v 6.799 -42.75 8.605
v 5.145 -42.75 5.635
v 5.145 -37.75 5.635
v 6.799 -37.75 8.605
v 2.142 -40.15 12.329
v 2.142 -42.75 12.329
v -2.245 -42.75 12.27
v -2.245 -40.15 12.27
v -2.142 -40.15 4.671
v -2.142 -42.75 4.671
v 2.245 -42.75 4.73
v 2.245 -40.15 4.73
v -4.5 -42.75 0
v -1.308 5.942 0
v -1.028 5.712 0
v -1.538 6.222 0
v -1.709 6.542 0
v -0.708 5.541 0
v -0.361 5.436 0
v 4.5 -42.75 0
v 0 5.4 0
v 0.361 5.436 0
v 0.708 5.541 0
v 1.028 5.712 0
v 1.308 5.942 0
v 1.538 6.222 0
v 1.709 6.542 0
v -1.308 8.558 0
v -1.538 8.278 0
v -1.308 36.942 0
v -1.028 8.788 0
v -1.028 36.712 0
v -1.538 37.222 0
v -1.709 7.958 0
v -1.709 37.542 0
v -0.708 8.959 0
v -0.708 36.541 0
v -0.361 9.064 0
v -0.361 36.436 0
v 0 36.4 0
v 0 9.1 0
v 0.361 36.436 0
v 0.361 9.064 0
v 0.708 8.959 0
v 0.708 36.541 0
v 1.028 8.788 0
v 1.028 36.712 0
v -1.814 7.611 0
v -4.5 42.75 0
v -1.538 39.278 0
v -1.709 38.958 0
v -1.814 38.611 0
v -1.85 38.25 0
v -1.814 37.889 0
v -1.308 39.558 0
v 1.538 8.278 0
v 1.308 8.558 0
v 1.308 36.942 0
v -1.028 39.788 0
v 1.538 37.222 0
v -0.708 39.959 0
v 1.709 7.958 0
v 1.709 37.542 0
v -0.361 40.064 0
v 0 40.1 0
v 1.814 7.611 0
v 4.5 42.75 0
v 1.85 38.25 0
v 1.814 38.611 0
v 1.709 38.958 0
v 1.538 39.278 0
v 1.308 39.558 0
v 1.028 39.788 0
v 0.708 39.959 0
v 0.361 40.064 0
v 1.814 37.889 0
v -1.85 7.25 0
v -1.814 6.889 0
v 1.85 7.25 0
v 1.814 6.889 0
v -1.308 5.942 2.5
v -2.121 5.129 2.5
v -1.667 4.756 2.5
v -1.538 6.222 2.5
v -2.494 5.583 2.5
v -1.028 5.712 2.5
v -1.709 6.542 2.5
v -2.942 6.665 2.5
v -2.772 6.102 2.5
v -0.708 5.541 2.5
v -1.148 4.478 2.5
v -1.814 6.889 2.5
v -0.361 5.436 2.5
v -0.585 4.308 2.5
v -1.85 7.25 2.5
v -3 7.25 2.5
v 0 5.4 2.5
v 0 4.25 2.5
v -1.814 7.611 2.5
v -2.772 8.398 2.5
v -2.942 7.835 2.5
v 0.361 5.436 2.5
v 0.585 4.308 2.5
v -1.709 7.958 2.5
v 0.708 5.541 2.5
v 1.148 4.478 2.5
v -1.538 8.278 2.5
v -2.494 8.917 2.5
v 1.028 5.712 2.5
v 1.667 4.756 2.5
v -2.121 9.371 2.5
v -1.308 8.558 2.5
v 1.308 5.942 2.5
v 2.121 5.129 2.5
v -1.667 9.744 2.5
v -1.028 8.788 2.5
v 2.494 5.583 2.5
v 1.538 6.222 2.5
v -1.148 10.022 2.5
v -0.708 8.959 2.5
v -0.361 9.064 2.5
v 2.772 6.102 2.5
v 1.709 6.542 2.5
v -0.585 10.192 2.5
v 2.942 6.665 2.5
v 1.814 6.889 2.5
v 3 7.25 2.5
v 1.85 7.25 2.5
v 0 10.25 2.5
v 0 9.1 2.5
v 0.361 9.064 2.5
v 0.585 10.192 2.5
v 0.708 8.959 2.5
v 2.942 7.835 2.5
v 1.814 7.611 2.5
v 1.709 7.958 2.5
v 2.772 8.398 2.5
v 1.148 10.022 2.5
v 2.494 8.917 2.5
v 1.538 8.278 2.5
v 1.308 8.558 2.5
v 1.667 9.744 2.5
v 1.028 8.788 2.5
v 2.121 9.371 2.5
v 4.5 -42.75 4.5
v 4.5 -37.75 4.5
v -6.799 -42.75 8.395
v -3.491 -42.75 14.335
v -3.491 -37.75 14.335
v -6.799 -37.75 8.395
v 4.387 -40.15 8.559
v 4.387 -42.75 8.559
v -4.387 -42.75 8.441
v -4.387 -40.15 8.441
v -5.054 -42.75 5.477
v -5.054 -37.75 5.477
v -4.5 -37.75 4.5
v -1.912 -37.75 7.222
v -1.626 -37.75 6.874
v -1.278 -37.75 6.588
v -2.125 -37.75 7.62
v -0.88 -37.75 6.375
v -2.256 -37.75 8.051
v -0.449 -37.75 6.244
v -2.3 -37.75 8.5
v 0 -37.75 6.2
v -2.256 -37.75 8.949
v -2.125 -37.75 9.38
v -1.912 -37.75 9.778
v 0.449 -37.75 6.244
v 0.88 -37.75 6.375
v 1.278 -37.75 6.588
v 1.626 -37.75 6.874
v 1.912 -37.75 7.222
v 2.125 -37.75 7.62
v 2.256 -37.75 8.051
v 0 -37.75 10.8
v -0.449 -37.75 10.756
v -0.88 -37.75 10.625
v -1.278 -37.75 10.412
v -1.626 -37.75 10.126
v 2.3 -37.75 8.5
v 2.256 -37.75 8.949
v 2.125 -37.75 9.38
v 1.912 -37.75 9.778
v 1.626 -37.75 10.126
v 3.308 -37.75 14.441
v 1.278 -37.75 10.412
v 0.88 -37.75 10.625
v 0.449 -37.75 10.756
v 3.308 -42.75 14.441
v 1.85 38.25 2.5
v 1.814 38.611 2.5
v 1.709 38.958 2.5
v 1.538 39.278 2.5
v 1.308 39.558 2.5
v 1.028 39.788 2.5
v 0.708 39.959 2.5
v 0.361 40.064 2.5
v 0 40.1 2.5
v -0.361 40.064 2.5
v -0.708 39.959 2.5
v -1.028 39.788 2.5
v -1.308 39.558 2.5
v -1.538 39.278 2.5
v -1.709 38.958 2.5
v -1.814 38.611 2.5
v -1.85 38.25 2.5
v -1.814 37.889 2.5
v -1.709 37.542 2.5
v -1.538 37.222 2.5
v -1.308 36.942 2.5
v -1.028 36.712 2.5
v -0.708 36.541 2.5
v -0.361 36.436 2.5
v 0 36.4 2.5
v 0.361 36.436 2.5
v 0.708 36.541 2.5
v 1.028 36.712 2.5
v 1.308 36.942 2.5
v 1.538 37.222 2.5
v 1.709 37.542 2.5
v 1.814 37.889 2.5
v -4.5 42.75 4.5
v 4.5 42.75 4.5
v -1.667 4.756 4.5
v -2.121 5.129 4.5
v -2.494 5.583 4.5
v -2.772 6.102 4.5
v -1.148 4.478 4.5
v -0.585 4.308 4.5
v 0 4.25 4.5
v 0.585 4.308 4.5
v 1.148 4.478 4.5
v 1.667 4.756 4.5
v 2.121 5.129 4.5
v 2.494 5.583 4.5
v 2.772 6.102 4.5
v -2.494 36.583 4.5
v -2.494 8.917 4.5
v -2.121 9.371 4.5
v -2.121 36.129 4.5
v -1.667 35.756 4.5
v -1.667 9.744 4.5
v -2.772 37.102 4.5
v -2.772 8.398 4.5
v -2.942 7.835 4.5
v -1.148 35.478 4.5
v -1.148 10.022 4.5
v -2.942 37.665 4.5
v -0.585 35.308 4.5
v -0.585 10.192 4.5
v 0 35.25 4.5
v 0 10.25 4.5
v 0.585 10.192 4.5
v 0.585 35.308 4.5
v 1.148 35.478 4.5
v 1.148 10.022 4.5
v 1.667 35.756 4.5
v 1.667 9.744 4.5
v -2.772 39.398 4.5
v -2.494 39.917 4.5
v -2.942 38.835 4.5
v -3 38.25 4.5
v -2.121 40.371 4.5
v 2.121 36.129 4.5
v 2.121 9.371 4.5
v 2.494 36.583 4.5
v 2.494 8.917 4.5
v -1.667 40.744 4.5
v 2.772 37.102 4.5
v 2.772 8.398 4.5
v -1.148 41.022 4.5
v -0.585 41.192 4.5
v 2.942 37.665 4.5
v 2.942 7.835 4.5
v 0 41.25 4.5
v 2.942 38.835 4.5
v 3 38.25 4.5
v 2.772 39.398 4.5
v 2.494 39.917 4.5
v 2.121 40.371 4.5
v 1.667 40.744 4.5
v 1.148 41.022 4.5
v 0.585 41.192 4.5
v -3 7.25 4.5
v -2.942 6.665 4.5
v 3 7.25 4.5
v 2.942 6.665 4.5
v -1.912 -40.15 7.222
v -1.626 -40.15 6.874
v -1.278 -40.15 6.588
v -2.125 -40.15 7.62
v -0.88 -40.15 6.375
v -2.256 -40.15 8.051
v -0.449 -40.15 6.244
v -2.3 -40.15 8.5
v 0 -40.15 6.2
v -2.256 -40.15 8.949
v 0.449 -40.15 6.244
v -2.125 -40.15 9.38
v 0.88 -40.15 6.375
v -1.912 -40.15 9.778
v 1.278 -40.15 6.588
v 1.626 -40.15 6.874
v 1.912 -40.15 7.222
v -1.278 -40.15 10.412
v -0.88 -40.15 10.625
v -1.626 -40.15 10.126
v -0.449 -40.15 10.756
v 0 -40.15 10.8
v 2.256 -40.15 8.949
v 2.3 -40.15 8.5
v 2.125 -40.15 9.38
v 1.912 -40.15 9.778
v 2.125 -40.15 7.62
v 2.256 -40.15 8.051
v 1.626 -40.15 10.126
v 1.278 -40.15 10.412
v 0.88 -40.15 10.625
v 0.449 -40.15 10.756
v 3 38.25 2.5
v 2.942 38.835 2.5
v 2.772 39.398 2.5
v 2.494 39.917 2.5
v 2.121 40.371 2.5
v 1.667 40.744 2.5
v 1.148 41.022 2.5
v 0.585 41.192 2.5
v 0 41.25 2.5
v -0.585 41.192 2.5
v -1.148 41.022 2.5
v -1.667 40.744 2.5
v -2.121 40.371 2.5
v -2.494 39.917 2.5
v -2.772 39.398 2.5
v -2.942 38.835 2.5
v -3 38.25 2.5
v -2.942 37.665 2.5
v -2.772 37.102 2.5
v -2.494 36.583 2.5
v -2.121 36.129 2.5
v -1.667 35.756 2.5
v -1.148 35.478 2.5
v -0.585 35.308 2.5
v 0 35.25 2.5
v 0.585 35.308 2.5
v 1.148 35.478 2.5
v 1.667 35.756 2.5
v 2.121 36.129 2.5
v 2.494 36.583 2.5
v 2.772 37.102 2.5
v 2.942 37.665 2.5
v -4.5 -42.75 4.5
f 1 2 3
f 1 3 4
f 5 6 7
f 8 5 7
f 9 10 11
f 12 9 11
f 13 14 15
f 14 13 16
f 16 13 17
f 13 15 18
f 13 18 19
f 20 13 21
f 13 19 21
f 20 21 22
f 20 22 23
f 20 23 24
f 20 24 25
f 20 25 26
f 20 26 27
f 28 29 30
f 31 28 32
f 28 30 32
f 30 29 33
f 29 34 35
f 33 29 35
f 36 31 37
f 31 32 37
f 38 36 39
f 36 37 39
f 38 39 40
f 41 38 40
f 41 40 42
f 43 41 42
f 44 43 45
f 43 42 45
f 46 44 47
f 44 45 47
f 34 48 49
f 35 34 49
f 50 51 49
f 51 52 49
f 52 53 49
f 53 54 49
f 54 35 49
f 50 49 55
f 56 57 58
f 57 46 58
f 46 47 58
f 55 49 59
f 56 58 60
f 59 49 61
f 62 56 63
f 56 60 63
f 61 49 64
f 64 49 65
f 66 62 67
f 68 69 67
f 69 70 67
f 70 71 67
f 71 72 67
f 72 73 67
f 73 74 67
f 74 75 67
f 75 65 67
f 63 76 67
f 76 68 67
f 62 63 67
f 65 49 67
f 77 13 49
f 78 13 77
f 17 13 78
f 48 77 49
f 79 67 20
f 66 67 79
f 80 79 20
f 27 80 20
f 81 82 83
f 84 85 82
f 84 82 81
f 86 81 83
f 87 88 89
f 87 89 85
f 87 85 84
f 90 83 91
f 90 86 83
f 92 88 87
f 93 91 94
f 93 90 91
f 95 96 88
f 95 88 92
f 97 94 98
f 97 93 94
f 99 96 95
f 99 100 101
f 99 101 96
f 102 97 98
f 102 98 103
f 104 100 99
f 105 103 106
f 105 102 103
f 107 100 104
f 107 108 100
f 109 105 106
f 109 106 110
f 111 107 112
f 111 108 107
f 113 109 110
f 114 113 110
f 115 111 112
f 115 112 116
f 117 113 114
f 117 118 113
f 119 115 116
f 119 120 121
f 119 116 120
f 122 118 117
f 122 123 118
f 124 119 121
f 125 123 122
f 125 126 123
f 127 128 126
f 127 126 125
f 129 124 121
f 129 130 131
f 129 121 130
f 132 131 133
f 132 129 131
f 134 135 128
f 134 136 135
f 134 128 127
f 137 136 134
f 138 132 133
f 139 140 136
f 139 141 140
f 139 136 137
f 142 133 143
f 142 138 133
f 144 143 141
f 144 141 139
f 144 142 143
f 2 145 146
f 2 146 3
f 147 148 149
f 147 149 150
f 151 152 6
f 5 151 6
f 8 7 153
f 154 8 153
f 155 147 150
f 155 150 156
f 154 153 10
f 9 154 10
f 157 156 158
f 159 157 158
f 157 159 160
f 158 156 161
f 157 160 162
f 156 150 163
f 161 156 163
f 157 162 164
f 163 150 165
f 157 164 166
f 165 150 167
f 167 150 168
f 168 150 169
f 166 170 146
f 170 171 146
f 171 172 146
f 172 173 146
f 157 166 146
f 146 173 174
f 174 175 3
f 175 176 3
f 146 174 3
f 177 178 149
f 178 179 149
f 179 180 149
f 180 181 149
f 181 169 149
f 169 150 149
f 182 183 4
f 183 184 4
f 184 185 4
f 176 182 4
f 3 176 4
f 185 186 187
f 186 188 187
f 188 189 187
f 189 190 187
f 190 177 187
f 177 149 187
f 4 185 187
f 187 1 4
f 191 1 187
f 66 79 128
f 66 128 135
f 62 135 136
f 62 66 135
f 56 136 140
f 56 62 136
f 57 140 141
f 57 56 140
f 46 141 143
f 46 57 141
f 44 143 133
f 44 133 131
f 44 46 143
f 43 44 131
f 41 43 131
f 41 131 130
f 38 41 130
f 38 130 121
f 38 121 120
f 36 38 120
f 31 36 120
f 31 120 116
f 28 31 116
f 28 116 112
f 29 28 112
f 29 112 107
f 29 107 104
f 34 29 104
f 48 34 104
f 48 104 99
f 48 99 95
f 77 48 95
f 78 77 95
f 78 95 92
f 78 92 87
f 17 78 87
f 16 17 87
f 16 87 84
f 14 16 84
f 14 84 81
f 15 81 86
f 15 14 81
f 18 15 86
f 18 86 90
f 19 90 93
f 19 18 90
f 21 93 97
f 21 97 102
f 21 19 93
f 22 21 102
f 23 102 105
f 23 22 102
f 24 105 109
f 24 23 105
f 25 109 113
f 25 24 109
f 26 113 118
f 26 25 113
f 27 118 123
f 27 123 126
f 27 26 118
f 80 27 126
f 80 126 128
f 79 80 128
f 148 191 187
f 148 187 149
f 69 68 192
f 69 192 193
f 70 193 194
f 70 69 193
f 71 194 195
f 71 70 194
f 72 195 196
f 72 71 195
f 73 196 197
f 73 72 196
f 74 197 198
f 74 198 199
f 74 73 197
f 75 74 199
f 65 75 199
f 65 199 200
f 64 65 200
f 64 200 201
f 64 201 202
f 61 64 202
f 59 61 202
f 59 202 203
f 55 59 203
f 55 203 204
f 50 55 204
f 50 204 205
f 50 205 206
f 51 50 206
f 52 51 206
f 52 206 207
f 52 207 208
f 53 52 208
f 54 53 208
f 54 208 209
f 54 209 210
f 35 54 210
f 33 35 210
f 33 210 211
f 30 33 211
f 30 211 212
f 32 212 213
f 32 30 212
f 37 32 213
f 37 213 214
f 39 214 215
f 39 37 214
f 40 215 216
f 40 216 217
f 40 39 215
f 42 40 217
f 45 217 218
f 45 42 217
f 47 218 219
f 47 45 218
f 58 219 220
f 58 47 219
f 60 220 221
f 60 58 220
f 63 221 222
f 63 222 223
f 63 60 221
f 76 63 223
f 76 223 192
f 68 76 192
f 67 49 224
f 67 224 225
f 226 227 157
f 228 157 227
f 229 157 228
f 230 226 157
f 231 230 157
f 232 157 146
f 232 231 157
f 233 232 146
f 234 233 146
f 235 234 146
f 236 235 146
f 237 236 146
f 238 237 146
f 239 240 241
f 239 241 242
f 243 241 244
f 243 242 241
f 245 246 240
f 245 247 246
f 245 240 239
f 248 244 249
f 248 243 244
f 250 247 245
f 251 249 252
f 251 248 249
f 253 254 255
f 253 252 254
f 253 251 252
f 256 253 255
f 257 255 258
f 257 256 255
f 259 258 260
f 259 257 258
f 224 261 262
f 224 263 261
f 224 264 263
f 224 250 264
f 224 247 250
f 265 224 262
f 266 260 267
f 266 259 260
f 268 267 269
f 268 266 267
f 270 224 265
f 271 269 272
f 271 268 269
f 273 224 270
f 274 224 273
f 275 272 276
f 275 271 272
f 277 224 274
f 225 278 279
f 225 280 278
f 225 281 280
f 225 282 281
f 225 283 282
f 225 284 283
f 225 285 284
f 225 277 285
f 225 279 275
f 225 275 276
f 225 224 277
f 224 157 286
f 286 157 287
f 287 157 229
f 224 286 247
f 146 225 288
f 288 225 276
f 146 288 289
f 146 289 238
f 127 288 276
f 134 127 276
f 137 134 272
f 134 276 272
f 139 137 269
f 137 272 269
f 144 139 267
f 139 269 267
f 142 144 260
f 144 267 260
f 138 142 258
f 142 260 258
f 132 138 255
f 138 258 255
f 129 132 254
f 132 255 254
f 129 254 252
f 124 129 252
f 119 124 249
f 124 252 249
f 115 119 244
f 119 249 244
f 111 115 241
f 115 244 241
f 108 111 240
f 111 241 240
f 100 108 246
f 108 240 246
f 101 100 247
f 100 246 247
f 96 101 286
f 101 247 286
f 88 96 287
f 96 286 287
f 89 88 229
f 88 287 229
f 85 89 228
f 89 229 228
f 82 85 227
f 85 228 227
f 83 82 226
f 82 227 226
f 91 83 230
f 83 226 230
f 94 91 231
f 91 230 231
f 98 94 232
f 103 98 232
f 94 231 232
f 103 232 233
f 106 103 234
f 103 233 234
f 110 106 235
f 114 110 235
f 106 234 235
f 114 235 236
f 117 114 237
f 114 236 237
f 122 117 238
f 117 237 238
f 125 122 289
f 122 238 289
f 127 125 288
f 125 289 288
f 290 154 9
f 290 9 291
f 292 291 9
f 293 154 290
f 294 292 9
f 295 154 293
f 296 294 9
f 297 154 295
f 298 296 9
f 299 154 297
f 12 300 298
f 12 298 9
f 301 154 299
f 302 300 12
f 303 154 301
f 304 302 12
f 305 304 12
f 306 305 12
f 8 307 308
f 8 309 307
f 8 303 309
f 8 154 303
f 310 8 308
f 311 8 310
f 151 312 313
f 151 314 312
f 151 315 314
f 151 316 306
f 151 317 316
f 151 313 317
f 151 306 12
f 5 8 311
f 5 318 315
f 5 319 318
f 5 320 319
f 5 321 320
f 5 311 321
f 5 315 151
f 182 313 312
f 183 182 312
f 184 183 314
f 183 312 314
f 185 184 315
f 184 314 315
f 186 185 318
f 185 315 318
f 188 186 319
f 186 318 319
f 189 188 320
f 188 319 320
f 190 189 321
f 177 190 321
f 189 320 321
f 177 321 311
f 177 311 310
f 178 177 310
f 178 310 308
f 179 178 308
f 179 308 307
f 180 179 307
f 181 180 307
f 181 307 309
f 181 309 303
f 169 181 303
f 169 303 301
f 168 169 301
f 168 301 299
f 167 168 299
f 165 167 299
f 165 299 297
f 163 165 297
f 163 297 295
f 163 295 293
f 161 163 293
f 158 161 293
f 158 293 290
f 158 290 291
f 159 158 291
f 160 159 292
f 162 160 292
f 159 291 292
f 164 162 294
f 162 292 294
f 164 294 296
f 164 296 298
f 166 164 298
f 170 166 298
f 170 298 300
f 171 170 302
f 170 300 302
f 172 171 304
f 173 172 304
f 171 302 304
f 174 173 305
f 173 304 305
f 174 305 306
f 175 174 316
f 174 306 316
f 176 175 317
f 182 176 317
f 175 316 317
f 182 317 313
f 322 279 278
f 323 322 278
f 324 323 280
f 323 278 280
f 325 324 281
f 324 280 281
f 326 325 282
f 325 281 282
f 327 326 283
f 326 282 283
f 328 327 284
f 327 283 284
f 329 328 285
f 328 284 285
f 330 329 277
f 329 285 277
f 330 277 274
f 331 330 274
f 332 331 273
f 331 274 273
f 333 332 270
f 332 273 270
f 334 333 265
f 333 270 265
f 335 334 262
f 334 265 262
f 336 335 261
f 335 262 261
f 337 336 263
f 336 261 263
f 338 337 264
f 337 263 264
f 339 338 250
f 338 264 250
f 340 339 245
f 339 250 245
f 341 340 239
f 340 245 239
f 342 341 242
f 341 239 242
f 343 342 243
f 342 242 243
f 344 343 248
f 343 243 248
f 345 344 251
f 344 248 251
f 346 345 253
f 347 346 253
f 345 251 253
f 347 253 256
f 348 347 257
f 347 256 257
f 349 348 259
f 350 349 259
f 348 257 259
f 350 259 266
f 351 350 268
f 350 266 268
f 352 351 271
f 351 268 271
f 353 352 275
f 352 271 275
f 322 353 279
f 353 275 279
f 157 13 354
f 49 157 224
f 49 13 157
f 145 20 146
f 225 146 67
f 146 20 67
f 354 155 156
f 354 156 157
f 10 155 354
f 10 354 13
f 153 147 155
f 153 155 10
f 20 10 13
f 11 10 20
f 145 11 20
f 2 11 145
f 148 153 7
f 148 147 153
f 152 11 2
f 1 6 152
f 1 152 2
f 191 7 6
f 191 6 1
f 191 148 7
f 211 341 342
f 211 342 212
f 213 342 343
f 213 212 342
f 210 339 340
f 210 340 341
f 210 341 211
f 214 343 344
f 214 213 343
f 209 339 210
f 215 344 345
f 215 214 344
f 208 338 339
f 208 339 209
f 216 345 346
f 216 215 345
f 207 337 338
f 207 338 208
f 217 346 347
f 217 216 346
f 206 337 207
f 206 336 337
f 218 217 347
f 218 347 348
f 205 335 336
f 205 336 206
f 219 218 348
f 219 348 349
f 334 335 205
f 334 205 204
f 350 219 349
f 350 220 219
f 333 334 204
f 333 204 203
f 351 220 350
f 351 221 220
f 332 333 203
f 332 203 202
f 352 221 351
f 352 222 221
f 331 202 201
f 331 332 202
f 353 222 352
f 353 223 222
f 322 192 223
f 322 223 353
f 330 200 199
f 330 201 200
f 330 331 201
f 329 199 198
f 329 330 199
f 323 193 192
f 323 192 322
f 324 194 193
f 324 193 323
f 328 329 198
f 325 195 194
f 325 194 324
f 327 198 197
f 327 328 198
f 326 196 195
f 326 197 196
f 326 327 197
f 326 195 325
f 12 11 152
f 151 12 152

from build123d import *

# Parameters (mm, degrees)
F0_W     = 9
F0_H     = 85.5
F0_R     = 1.85
F1_DEPTH = 4.5
F2_R     = 2.3
F3_DEPTH = 5
F4_R     = 2.3
F5_DEPTH = 2.6
F6_R     = 3
F6_R_2   = 1.85
F7_DEPTH = 2


with BuildPart() as f1:
    # F0 (on Top) → F1 (new body)
    with BuildSketch(Plane.XY):
        Rectangle(F0_W, F0_H)
        with Locations((0, 7.25)):
            Circle(F0_R, mode=Mode.SUBTRACT)
        with Locations((0, 38.25)):
            Circle(F0_R, mode=Mode.SUBTRACT)
    extrude(amount=F1_DEPTH)

    # F2 (on face) → F3 (join)
    with BuildSketch(Plane.XZ.offset(42.75)):
        Polygon((5.144893, 5.634928), (6.799043, 8.605333), (3.3083, 14.44081), (-3.490743, 14.335477), (-6.799043, 8.394667), (-5.053671, 5.476928), (-4.5, 4.5), (4.5, 4.5), align=None)
        with Locations((0, 8.5)):
            Circle(F2_R, mode=Mode.SUBTRACT)
    extrude(amount=-F3_DEPTH)

    # F4 (on face) → F5 (cut)
    with BuildSketch(Plane.XZ.offset(42.75)):
        Polygon((4.387461, 8.559325), (2.142354, 12.329315), (-2.245107, 12.26999), (-4.387461, 8.440675), (-2.142354, 4.670685), (2.245107, 4.73001), align=None)
        with Locations((0, 8.5)):
            Circle(F4_R, mode=Mode.SUBTRACT)
    extrude(amount=-F5_DEPTH, mode=Mode.SUBTRACT)

    # F6 (on face) → F7 (cut)
    with BuildSketch(Plane.XY.offset(4.5)):
        with Locations((0, 38.25)):
            Circle(F6_R)
        with Locations((0, 38.25)):
            Circle(F6_R_2, mode=Mode.SUBTRACT)
        with Locations((0, 7.25)):
            Circle(F6_R)
        with Locations((0, 7.25)):
            Circle(F6_R_2, mode=Mode.SUBTRACT)
    extrude(amount=-F7_DEPTH, mode=Mode.SUBTRACT)


solid = f1.part
